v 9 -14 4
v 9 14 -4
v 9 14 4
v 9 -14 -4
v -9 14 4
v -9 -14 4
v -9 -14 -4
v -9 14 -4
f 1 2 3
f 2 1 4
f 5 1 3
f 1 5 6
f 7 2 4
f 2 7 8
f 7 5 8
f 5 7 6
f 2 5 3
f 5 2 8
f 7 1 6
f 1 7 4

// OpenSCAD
color("CornflowerBlue")cube([18,28,8],true);
 box=[18,28,8];cube(box,true);
